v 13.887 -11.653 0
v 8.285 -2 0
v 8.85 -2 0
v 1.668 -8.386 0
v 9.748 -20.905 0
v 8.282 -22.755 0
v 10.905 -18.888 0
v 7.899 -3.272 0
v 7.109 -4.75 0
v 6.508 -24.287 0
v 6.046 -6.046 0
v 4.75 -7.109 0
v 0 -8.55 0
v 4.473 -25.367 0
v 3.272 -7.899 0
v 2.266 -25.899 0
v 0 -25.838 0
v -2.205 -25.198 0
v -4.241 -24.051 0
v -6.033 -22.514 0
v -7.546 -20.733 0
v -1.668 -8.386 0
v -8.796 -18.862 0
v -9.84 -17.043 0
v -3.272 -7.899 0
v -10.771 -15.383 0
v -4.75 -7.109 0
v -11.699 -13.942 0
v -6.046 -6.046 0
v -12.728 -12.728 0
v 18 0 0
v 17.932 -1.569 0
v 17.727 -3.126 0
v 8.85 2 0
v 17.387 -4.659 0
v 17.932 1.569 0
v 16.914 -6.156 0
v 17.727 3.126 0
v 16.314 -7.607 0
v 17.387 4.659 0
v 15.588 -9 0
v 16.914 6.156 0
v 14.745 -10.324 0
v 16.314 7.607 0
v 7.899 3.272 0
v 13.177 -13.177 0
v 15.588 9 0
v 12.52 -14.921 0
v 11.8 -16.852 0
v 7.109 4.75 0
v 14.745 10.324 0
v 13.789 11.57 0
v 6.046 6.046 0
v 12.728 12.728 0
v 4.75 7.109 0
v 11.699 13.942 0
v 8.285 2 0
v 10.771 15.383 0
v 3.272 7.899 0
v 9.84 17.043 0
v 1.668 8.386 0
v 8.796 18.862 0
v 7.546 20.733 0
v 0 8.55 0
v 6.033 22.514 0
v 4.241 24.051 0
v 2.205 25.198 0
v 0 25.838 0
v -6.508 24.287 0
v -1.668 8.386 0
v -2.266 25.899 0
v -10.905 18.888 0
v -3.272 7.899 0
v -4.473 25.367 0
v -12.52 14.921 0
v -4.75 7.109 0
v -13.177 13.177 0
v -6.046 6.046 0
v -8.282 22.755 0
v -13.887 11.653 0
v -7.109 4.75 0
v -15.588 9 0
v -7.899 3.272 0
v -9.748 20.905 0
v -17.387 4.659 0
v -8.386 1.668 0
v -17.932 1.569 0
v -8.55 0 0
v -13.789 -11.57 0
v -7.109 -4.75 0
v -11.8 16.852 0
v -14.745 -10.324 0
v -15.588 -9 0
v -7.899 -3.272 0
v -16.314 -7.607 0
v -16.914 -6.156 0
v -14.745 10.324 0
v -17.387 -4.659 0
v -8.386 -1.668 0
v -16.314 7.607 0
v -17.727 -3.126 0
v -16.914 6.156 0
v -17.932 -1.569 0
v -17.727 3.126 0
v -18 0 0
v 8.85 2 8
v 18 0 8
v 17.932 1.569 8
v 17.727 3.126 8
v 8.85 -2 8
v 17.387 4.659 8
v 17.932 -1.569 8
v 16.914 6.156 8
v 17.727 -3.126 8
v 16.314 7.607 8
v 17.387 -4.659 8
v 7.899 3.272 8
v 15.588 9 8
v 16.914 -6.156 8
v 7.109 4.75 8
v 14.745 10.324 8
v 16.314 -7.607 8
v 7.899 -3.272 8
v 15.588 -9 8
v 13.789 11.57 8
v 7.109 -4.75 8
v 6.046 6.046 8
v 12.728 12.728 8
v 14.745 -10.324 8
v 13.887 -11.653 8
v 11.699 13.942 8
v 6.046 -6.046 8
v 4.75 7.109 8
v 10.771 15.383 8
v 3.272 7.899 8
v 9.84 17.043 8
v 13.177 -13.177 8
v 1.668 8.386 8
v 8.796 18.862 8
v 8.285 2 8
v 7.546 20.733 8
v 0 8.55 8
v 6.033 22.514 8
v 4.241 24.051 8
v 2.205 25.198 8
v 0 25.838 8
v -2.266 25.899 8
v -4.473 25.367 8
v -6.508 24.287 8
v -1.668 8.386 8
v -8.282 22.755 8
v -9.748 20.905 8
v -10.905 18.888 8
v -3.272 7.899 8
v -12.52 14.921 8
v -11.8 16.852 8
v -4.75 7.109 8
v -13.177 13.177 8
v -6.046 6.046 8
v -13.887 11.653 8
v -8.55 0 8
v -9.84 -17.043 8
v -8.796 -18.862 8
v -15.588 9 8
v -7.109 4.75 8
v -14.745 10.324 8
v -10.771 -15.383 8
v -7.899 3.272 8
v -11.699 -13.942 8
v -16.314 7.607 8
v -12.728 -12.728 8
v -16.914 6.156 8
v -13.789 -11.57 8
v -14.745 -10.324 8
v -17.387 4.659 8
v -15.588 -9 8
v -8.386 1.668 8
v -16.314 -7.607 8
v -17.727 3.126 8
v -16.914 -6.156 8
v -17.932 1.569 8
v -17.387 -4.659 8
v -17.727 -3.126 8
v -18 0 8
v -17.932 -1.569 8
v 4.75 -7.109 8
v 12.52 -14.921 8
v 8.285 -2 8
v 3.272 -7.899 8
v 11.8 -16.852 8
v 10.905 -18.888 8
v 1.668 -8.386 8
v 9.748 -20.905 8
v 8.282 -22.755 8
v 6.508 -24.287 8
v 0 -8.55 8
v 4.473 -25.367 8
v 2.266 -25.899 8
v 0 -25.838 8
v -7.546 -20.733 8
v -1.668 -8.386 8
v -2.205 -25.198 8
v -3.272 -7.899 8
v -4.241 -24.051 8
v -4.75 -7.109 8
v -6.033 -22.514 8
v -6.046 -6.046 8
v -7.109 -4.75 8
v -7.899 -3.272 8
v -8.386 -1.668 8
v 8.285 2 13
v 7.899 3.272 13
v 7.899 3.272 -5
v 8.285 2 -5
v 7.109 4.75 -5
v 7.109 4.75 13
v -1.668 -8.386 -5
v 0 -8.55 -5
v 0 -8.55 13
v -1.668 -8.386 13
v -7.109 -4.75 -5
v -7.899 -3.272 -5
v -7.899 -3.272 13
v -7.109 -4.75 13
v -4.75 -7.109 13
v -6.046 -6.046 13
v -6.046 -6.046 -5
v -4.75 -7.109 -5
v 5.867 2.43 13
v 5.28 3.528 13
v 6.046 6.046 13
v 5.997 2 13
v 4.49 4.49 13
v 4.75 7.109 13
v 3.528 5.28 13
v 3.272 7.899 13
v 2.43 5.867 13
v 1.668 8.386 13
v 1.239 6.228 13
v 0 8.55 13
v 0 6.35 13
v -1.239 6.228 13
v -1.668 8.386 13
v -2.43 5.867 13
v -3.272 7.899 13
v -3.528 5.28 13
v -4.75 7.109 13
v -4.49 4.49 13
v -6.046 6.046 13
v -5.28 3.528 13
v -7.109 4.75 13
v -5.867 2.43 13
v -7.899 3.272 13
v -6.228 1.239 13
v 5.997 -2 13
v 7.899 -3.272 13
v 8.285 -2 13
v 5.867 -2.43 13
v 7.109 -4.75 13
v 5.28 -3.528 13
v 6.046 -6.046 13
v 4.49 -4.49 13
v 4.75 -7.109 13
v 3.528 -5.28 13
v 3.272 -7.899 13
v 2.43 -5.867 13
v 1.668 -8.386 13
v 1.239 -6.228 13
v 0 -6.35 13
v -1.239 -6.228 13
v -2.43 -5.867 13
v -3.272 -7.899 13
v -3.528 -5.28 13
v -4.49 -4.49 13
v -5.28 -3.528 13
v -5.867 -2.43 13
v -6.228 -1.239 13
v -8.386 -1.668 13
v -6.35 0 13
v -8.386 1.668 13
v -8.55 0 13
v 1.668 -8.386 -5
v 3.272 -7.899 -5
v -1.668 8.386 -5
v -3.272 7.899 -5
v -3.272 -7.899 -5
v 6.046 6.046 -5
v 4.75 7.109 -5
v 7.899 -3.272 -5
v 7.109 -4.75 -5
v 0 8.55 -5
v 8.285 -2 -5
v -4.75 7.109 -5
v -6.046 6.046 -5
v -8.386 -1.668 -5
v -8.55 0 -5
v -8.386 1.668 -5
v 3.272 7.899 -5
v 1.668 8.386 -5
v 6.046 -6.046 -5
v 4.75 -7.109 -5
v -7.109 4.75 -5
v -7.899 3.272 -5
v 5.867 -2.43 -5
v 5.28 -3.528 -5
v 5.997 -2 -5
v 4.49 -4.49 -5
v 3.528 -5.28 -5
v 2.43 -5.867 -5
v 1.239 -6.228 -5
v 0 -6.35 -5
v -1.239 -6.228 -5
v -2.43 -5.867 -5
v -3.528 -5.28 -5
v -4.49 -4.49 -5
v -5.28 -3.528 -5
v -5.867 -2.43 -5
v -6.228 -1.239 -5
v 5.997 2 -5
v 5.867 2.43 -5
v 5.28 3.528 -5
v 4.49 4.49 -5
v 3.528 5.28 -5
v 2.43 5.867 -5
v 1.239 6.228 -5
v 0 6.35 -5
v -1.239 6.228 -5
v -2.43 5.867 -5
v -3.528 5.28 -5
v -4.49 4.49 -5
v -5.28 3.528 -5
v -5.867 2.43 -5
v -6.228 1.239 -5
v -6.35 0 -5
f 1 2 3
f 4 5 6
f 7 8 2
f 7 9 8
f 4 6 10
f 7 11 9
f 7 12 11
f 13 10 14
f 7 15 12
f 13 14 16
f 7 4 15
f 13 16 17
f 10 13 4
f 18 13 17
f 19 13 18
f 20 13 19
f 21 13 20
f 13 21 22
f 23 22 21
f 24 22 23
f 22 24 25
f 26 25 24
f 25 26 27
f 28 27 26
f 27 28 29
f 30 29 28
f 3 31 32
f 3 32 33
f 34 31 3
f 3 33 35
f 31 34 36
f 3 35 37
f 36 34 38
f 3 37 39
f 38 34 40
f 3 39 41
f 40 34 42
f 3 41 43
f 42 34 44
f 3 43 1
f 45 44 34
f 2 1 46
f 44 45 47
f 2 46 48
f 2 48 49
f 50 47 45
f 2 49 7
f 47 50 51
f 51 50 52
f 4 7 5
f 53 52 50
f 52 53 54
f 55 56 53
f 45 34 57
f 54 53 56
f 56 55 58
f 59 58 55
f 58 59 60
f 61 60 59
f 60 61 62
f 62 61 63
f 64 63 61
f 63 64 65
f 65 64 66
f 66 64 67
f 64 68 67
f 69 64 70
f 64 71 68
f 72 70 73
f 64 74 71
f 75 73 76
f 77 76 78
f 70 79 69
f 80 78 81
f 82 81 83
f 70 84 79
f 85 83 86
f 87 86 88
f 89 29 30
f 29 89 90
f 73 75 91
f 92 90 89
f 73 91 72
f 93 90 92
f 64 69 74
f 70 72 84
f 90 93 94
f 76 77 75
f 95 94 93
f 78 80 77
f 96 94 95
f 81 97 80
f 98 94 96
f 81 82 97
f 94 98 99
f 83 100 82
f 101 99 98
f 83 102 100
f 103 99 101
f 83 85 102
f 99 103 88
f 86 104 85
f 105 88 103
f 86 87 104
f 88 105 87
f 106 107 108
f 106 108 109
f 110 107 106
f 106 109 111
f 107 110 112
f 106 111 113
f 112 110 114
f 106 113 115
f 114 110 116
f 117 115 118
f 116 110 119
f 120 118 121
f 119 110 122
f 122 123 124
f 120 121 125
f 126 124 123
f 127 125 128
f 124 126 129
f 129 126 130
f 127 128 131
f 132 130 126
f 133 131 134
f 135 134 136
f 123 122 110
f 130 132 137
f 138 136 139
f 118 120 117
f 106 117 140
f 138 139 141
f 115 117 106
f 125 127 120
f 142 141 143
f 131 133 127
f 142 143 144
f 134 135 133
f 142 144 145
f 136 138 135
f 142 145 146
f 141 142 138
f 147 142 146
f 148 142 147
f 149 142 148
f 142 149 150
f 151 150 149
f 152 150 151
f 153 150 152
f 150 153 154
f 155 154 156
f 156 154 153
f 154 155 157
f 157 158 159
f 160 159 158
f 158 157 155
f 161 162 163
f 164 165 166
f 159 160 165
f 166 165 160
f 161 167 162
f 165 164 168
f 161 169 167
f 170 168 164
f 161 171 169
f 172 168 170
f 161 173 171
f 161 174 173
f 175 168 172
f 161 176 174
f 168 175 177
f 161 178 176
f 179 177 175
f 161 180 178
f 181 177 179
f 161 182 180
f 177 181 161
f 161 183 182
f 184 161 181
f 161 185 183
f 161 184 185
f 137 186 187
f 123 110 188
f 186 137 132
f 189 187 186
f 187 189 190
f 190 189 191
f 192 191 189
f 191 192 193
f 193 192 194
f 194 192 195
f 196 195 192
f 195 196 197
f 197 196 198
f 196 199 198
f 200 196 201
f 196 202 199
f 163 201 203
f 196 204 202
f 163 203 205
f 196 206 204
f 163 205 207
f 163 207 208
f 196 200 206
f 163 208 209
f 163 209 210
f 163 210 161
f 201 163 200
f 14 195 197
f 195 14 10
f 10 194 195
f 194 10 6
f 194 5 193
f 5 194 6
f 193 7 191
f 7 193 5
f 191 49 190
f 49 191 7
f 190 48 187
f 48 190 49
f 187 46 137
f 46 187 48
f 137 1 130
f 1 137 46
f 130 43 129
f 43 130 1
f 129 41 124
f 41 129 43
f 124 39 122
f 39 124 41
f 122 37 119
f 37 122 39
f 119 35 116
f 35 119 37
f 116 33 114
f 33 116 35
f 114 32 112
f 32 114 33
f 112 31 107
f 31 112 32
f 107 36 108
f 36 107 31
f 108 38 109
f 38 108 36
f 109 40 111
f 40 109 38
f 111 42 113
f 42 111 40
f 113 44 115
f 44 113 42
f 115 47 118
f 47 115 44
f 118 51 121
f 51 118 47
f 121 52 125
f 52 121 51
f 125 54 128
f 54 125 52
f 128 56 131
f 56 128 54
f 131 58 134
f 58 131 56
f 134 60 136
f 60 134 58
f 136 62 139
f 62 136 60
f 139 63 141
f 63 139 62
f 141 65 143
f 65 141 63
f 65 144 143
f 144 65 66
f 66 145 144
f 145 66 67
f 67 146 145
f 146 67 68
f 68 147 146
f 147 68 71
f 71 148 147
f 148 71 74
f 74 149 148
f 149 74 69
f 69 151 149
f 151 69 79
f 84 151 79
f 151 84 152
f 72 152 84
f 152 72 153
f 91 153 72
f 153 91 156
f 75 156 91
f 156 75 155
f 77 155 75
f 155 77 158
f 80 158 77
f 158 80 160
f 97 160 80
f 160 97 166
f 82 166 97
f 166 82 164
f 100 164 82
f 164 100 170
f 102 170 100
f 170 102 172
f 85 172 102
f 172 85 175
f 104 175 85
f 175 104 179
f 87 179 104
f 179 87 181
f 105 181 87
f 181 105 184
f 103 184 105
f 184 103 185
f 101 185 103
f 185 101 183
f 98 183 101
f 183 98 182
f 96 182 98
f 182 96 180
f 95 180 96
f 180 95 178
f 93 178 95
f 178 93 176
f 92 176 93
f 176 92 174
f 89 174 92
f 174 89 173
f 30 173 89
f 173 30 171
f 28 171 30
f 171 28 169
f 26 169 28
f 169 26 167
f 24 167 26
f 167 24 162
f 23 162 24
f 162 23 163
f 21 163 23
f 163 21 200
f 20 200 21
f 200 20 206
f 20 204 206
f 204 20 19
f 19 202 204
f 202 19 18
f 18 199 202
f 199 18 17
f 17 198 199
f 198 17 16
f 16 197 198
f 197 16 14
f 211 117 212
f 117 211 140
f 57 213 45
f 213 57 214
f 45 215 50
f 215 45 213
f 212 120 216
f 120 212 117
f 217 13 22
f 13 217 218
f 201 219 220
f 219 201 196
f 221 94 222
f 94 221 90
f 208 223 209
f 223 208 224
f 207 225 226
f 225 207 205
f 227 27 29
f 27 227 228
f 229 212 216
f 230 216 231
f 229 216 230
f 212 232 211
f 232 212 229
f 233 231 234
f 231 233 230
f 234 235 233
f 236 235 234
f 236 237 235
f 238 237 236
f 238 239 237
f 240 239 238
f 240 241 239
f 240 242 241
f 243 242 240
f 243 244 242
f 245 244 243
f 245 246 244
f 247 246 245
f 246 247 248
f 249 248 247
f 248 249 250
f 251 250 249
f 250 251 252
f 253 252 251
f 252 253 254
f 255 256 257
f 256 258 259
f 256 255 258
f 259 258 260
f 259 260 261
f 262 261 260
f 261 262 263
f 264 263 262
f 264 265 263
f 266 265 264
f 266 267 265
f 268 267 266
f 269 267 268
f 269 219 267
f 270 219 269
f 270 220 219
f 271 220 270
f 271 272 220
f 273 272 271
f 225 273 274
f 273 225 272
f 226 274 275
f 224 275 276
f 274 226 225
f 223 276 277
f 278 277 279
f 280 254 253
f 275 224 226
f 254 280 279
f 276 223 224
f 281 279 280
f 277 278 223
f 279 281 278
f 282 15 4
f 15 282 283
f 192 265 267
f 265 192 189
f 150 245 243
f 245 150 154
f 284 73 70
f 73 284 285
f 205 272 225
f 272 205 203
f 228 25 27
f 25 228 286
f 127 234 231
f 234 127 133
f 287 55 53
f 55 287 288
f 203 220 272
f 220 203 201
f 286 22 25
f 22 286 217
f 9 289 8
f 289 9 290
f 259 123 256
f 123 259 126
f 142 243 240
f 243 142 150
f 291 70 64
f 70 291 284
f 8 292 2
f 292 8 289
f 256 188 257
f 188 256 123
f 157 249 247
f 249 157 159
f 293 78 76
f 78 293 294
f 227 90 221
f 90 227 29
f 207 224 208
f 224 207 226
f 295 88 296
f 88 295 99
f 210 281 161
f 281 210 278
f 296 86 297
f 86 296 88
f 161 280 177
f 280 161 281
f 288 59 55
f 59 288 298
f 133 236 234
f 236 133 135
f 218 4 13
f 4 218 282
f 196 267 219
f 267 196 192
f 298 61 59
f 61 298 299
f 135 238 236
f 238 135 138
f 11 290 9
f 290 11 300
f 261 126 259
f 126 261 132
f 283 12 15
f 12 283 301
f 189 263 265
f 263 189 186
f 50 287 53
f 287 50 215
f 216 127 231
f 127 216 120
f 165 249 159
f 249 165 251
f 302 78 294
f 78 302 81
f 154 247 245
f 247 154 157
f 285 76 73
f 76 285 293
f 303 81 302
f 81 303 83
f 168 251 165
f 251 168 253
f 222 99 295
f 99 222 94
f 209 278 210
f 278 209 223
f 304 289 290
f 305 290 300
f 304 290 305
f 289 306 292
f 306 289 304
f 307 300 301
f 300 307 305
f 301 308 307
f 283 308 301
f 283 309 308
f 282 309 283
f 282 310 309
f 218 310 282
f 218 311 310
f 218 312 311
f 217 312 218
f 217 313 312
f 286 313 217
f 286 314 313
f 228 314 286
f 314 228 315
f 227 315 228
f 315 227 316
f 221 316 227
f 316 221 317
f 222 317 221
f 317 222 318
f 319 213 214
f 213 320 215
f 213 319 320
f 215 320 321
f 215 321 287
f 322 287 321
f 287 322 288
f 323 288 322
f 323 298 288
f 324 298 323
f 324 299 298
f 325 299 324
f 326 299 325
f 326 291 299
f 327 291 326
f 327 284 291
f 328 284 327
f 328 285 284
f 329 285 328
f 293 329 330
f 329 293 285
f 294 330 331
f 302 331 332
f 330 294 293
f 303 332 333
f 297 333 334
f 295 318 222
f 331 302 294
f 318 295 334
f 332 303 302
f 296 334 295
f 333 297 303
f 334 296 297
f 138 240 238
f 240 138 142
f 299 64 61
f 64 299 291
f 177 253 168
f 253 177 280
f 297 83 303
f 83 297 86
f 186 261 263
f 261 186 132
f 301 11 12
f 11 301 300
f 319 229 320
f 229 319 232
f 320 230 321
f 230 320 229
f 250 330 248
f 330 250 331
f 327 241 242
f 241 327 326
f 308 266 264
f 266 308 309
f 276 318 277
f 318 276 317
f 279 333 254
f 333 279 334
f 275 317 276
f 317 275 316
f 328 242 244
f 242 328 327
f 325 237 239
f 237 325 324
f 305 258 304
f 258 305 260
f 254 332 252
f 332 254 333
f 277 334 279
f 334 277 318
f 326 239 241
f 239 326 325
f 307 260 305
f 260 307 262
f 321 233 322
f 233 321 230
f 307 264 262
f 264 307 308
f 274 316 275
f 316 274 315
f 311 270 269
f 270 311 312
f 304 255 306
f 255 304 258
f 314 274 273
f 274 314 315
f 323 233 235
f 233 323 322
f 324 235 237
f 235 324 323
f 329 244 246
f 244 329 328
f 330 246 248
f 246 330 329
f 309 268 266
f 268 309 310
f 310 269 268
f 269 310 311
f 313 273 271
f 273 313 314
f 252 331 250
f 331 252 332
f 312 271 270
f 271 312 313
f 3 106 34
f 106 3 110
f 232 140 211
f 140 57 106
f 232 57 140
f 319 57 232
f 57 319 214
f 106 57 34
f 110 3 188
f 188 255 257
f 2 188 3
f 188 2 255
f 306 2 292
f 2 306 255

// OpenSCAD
$fn = 32;

// ----------------------------------------------------------------------
// Cam: base radius 18 mm with a 8 mm lift over 180 degrees
// ----------------------------------------------------------------------

// --- parameters (mm) ---
base_r = 18;              // base radius
lift = 8;                 // lift height above the base radius
lift_span = 180;          // angular width of the lift
lift_start = 45;          // angle where the lift starts
cam_t = 8;                // cam plate thickness
hub_d = 17.1;             // hub diameter
hub_h = 18;               // hub height
bore_d = 12.7;            // bore
key_w = 4;                // keyway width
key_depth = 1.6;          // keyway depth

cam_profile = [[18, 0], [17.932, 1.569], [17.727, 3.126], [17.387, 4.659], [16.914, 6.156], [16.314, 7.607], [15.588, 9], [14.745, 10.324], [13.789, 11.57], [12.728, 12.728], [11.699, 13.942], [10.771, 15.383], [9.84, 17.043], [8.796, 18.862], [7.546, 20.733], [6.033, 22.514], [4.241, 24.051], [2.205, 25.198], [0, 25.838], [-2.266, 25.899], [-4.473, 25.367], [-6.508, 24.287], [-8.282, 22.755], [-9.748, 20.905], [-10.905, 18.888], [-11.8, 16.852], [-12.52, 14.921], [-13.177, 13.177], [-13.887, 11.653], [-14.745, 10.324], [-15.588, 9], [-16.314, 7.607], [-16.914, 6.156], [-17.387, 4.659], [-17.727, 3.126], [-17.932, 1.569], [-18, 0], [-17.932, -1.569], [-17.727, -3.126], [-17.387, -4.659], [-16.914, -6.156], [-16.314, -7.607], [-15.588, -9], [-14.745, -10.324], [-13.789, -11.57], [-12.728, -12.728], [-11.699, -13.942], [-10.771, -15.383], [-9.84, -17.043], [-8.796, -18.862], [-7.546, -20.733], [-6.033, -22.514], [-4.241, -24.051], [-2.205, -25.198], [0, -25.838], [2.266, -25.899], [4.473, -25.367], [6.508, -24.287], [8.282, -22.755], [9.748, -20.905], [10.905, -18.888], [11.8, -16.852], [12.52, -14.921], [13.177, -13.177], [13.887, -11.653], [14.745, -10.324], [15.588, -9], [16.314, -7.607], [16.914, -6.156], [17.387, -4.659], [17.727, -3.126], [17.932, -1.569]];

difference() {
  union() {
    linear_extrude(height = cam_t) polygon(cam_profile);
    /* hub, proud of the cam plate on both sides */
    translate([0, 0, -5]) cylinder(h = hub_h, d = hub_d);
  }
  /* bore through the hub, 2.5 mm clear on both faces */
  translate([0, 0, -7.5]) cylinder(h = hub_h + 5, d = bore_d);
  /* keyway, milled through the whole hub */
  translate([4.75, -2, -7.5]) cube([4.1, 4, 23]);
}
